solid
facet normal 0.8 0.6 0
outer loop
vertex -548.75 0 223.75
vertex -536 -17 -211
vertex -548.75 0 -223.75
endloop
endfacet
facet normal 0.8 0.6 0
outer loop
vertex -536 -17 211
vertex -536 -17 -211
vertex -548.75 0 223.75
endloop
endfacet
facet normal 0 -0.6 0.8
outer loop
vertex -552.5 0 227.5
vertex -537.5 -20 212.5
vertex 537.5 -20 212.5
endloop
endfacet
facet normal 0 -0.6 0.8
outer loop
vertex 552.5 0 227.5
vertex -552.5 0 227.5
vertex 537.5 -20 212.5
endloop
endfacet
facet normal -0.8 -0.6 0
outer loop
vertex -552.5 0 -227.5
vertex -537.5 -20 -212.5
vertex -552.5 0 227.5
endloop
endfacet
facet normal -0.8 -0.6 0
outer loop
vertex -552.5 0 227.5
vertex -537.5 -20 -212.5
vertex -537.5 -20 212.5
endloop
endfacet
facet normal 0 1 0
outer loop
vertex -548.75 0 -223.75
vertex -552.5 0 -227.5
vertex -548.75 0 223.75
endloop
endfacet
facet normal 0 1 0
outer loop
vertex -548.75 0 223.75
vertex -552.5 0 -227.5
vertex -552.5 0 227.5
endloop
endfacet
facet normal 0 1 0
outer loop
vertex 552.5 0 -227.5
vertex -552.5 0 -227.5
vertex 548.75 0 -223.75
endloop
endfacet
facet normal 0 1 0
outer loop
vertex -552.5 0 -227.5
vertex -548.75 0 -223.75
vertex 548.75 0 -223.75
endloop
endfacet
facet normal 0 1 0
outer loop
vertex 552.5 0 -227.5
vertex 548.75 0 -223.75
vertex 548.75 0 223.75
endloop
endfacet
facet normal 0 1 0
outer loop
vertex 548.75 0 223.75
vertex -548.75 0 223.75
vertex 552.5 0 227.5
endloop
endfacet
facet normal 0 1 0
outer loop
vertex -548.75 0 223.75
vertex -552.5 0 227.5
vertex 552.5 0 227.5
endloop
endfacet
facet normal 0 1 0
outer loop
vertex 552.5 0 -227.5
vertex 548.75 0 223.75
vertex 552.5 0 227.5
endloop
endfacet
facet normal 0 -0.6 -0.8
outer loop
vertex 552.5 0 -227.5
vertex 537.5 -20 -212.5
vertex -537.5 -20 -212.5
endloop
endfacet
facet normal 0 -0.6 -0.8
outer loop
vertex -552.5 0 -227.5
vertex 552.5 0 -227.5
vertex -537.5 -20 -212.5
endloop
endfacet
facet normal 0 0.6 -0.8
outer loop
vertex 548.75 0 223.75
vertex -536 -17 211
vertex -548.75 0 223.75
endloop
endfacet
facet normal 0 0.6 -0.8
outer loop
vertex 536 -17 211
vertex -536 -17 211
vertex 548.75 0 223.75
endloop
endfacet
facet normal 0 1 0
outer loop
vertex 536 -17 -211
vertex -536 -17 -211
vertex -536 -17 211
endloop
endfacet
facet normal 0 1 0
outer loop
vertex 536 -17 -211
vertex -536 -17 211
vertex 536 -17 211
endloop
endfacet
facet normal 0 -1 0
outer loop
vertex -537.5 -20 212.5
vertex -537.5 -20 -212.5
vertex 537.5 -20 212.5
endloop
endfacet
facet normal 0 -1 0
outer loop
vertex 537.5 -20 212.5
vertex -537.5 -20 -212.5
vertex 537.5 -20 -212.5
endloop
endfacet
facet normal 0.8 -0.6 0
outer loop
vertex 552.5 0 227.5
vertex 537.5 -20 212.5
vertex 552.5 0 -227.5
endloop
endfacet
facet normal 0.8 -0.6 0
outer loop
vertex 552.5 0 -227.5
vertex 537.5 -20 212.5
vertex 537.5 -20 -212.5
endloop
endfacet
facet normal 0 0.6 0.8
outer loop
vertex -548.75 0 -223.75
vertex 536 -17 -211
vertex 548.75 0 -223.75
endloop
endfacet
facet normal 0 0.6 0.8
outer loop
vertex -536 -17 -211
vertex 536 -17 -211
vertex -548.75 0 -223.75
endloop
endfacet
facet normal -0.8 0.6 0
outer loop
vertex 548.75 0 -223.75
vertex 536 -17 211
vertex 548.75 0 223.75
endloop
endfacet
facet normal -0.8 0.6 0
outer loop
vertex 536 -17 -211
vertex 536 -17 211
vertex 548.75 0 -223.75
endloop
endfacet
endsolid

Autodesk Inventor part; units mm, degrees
ref_plane "YZ Plane" through (0, 0, 0) normal (1, 0, 0) x (0, 1, 0)
ref_plane "XY Plane" through (0, 0, 0) normal (0, 0, 1) x (1, 0, 0)
sketch "Sketch1" plane through (0, 0, 0) normal (0, 1, 0) x (-1, 0, 0)
  line L0 (552.5, 227.5) -> (-552.5, 227.5)
  line L1 (-552.5, 227.5) -> (-552.5, -227.5)
  line L2 (-552.5, -227.5) -> (552.5, -227.5)
  line L3 (552.5, -227.5) -> (552.5, 227.5)
  line L4 (552.5, 227.5) -> (-552.5, -227.5) construction
  line L5 (-552.5, 227.5) -> (552.5, -227.5) construction
  point P0 (0, 0)
  dimension "d0" = 1105
  dimension "d1" = 455
ref_plane "Work Plane1" through (0, -20, 0) normal (0, 1, 0) x (-1, 0, 0)
sketch "Sketch2" plane through (0, -20, 0) normal (0, 1, 0) x (-1, 0, 0)
  line L0 (-537.5, 212.5) -> (537.5, 212.5)
  line L1 (537.5, 212.5) -> (537.5, -212.5)
  line L2 (537.5, -212.5) -> (-537.5, -212.5)
  line L3 (-537.5, -212.5) -> (-537.5, 212.5)
  line L4 (-537.5, 212.5) -> (537.5, -212.5) construction
  line L5 (537.5, 212.5) -> (-537.5, -212.5) construction
  point P0 (0, 0)
  dimension "d3" = 1075
  dimension "d4" = 425
loft "Loft1" add profiles "Sketch1", "Sketch2"
shell "Shell1" thickness 3 removed faces 1 at (184.1667, 0, 75.8333)
properties part number "ChipTray"
